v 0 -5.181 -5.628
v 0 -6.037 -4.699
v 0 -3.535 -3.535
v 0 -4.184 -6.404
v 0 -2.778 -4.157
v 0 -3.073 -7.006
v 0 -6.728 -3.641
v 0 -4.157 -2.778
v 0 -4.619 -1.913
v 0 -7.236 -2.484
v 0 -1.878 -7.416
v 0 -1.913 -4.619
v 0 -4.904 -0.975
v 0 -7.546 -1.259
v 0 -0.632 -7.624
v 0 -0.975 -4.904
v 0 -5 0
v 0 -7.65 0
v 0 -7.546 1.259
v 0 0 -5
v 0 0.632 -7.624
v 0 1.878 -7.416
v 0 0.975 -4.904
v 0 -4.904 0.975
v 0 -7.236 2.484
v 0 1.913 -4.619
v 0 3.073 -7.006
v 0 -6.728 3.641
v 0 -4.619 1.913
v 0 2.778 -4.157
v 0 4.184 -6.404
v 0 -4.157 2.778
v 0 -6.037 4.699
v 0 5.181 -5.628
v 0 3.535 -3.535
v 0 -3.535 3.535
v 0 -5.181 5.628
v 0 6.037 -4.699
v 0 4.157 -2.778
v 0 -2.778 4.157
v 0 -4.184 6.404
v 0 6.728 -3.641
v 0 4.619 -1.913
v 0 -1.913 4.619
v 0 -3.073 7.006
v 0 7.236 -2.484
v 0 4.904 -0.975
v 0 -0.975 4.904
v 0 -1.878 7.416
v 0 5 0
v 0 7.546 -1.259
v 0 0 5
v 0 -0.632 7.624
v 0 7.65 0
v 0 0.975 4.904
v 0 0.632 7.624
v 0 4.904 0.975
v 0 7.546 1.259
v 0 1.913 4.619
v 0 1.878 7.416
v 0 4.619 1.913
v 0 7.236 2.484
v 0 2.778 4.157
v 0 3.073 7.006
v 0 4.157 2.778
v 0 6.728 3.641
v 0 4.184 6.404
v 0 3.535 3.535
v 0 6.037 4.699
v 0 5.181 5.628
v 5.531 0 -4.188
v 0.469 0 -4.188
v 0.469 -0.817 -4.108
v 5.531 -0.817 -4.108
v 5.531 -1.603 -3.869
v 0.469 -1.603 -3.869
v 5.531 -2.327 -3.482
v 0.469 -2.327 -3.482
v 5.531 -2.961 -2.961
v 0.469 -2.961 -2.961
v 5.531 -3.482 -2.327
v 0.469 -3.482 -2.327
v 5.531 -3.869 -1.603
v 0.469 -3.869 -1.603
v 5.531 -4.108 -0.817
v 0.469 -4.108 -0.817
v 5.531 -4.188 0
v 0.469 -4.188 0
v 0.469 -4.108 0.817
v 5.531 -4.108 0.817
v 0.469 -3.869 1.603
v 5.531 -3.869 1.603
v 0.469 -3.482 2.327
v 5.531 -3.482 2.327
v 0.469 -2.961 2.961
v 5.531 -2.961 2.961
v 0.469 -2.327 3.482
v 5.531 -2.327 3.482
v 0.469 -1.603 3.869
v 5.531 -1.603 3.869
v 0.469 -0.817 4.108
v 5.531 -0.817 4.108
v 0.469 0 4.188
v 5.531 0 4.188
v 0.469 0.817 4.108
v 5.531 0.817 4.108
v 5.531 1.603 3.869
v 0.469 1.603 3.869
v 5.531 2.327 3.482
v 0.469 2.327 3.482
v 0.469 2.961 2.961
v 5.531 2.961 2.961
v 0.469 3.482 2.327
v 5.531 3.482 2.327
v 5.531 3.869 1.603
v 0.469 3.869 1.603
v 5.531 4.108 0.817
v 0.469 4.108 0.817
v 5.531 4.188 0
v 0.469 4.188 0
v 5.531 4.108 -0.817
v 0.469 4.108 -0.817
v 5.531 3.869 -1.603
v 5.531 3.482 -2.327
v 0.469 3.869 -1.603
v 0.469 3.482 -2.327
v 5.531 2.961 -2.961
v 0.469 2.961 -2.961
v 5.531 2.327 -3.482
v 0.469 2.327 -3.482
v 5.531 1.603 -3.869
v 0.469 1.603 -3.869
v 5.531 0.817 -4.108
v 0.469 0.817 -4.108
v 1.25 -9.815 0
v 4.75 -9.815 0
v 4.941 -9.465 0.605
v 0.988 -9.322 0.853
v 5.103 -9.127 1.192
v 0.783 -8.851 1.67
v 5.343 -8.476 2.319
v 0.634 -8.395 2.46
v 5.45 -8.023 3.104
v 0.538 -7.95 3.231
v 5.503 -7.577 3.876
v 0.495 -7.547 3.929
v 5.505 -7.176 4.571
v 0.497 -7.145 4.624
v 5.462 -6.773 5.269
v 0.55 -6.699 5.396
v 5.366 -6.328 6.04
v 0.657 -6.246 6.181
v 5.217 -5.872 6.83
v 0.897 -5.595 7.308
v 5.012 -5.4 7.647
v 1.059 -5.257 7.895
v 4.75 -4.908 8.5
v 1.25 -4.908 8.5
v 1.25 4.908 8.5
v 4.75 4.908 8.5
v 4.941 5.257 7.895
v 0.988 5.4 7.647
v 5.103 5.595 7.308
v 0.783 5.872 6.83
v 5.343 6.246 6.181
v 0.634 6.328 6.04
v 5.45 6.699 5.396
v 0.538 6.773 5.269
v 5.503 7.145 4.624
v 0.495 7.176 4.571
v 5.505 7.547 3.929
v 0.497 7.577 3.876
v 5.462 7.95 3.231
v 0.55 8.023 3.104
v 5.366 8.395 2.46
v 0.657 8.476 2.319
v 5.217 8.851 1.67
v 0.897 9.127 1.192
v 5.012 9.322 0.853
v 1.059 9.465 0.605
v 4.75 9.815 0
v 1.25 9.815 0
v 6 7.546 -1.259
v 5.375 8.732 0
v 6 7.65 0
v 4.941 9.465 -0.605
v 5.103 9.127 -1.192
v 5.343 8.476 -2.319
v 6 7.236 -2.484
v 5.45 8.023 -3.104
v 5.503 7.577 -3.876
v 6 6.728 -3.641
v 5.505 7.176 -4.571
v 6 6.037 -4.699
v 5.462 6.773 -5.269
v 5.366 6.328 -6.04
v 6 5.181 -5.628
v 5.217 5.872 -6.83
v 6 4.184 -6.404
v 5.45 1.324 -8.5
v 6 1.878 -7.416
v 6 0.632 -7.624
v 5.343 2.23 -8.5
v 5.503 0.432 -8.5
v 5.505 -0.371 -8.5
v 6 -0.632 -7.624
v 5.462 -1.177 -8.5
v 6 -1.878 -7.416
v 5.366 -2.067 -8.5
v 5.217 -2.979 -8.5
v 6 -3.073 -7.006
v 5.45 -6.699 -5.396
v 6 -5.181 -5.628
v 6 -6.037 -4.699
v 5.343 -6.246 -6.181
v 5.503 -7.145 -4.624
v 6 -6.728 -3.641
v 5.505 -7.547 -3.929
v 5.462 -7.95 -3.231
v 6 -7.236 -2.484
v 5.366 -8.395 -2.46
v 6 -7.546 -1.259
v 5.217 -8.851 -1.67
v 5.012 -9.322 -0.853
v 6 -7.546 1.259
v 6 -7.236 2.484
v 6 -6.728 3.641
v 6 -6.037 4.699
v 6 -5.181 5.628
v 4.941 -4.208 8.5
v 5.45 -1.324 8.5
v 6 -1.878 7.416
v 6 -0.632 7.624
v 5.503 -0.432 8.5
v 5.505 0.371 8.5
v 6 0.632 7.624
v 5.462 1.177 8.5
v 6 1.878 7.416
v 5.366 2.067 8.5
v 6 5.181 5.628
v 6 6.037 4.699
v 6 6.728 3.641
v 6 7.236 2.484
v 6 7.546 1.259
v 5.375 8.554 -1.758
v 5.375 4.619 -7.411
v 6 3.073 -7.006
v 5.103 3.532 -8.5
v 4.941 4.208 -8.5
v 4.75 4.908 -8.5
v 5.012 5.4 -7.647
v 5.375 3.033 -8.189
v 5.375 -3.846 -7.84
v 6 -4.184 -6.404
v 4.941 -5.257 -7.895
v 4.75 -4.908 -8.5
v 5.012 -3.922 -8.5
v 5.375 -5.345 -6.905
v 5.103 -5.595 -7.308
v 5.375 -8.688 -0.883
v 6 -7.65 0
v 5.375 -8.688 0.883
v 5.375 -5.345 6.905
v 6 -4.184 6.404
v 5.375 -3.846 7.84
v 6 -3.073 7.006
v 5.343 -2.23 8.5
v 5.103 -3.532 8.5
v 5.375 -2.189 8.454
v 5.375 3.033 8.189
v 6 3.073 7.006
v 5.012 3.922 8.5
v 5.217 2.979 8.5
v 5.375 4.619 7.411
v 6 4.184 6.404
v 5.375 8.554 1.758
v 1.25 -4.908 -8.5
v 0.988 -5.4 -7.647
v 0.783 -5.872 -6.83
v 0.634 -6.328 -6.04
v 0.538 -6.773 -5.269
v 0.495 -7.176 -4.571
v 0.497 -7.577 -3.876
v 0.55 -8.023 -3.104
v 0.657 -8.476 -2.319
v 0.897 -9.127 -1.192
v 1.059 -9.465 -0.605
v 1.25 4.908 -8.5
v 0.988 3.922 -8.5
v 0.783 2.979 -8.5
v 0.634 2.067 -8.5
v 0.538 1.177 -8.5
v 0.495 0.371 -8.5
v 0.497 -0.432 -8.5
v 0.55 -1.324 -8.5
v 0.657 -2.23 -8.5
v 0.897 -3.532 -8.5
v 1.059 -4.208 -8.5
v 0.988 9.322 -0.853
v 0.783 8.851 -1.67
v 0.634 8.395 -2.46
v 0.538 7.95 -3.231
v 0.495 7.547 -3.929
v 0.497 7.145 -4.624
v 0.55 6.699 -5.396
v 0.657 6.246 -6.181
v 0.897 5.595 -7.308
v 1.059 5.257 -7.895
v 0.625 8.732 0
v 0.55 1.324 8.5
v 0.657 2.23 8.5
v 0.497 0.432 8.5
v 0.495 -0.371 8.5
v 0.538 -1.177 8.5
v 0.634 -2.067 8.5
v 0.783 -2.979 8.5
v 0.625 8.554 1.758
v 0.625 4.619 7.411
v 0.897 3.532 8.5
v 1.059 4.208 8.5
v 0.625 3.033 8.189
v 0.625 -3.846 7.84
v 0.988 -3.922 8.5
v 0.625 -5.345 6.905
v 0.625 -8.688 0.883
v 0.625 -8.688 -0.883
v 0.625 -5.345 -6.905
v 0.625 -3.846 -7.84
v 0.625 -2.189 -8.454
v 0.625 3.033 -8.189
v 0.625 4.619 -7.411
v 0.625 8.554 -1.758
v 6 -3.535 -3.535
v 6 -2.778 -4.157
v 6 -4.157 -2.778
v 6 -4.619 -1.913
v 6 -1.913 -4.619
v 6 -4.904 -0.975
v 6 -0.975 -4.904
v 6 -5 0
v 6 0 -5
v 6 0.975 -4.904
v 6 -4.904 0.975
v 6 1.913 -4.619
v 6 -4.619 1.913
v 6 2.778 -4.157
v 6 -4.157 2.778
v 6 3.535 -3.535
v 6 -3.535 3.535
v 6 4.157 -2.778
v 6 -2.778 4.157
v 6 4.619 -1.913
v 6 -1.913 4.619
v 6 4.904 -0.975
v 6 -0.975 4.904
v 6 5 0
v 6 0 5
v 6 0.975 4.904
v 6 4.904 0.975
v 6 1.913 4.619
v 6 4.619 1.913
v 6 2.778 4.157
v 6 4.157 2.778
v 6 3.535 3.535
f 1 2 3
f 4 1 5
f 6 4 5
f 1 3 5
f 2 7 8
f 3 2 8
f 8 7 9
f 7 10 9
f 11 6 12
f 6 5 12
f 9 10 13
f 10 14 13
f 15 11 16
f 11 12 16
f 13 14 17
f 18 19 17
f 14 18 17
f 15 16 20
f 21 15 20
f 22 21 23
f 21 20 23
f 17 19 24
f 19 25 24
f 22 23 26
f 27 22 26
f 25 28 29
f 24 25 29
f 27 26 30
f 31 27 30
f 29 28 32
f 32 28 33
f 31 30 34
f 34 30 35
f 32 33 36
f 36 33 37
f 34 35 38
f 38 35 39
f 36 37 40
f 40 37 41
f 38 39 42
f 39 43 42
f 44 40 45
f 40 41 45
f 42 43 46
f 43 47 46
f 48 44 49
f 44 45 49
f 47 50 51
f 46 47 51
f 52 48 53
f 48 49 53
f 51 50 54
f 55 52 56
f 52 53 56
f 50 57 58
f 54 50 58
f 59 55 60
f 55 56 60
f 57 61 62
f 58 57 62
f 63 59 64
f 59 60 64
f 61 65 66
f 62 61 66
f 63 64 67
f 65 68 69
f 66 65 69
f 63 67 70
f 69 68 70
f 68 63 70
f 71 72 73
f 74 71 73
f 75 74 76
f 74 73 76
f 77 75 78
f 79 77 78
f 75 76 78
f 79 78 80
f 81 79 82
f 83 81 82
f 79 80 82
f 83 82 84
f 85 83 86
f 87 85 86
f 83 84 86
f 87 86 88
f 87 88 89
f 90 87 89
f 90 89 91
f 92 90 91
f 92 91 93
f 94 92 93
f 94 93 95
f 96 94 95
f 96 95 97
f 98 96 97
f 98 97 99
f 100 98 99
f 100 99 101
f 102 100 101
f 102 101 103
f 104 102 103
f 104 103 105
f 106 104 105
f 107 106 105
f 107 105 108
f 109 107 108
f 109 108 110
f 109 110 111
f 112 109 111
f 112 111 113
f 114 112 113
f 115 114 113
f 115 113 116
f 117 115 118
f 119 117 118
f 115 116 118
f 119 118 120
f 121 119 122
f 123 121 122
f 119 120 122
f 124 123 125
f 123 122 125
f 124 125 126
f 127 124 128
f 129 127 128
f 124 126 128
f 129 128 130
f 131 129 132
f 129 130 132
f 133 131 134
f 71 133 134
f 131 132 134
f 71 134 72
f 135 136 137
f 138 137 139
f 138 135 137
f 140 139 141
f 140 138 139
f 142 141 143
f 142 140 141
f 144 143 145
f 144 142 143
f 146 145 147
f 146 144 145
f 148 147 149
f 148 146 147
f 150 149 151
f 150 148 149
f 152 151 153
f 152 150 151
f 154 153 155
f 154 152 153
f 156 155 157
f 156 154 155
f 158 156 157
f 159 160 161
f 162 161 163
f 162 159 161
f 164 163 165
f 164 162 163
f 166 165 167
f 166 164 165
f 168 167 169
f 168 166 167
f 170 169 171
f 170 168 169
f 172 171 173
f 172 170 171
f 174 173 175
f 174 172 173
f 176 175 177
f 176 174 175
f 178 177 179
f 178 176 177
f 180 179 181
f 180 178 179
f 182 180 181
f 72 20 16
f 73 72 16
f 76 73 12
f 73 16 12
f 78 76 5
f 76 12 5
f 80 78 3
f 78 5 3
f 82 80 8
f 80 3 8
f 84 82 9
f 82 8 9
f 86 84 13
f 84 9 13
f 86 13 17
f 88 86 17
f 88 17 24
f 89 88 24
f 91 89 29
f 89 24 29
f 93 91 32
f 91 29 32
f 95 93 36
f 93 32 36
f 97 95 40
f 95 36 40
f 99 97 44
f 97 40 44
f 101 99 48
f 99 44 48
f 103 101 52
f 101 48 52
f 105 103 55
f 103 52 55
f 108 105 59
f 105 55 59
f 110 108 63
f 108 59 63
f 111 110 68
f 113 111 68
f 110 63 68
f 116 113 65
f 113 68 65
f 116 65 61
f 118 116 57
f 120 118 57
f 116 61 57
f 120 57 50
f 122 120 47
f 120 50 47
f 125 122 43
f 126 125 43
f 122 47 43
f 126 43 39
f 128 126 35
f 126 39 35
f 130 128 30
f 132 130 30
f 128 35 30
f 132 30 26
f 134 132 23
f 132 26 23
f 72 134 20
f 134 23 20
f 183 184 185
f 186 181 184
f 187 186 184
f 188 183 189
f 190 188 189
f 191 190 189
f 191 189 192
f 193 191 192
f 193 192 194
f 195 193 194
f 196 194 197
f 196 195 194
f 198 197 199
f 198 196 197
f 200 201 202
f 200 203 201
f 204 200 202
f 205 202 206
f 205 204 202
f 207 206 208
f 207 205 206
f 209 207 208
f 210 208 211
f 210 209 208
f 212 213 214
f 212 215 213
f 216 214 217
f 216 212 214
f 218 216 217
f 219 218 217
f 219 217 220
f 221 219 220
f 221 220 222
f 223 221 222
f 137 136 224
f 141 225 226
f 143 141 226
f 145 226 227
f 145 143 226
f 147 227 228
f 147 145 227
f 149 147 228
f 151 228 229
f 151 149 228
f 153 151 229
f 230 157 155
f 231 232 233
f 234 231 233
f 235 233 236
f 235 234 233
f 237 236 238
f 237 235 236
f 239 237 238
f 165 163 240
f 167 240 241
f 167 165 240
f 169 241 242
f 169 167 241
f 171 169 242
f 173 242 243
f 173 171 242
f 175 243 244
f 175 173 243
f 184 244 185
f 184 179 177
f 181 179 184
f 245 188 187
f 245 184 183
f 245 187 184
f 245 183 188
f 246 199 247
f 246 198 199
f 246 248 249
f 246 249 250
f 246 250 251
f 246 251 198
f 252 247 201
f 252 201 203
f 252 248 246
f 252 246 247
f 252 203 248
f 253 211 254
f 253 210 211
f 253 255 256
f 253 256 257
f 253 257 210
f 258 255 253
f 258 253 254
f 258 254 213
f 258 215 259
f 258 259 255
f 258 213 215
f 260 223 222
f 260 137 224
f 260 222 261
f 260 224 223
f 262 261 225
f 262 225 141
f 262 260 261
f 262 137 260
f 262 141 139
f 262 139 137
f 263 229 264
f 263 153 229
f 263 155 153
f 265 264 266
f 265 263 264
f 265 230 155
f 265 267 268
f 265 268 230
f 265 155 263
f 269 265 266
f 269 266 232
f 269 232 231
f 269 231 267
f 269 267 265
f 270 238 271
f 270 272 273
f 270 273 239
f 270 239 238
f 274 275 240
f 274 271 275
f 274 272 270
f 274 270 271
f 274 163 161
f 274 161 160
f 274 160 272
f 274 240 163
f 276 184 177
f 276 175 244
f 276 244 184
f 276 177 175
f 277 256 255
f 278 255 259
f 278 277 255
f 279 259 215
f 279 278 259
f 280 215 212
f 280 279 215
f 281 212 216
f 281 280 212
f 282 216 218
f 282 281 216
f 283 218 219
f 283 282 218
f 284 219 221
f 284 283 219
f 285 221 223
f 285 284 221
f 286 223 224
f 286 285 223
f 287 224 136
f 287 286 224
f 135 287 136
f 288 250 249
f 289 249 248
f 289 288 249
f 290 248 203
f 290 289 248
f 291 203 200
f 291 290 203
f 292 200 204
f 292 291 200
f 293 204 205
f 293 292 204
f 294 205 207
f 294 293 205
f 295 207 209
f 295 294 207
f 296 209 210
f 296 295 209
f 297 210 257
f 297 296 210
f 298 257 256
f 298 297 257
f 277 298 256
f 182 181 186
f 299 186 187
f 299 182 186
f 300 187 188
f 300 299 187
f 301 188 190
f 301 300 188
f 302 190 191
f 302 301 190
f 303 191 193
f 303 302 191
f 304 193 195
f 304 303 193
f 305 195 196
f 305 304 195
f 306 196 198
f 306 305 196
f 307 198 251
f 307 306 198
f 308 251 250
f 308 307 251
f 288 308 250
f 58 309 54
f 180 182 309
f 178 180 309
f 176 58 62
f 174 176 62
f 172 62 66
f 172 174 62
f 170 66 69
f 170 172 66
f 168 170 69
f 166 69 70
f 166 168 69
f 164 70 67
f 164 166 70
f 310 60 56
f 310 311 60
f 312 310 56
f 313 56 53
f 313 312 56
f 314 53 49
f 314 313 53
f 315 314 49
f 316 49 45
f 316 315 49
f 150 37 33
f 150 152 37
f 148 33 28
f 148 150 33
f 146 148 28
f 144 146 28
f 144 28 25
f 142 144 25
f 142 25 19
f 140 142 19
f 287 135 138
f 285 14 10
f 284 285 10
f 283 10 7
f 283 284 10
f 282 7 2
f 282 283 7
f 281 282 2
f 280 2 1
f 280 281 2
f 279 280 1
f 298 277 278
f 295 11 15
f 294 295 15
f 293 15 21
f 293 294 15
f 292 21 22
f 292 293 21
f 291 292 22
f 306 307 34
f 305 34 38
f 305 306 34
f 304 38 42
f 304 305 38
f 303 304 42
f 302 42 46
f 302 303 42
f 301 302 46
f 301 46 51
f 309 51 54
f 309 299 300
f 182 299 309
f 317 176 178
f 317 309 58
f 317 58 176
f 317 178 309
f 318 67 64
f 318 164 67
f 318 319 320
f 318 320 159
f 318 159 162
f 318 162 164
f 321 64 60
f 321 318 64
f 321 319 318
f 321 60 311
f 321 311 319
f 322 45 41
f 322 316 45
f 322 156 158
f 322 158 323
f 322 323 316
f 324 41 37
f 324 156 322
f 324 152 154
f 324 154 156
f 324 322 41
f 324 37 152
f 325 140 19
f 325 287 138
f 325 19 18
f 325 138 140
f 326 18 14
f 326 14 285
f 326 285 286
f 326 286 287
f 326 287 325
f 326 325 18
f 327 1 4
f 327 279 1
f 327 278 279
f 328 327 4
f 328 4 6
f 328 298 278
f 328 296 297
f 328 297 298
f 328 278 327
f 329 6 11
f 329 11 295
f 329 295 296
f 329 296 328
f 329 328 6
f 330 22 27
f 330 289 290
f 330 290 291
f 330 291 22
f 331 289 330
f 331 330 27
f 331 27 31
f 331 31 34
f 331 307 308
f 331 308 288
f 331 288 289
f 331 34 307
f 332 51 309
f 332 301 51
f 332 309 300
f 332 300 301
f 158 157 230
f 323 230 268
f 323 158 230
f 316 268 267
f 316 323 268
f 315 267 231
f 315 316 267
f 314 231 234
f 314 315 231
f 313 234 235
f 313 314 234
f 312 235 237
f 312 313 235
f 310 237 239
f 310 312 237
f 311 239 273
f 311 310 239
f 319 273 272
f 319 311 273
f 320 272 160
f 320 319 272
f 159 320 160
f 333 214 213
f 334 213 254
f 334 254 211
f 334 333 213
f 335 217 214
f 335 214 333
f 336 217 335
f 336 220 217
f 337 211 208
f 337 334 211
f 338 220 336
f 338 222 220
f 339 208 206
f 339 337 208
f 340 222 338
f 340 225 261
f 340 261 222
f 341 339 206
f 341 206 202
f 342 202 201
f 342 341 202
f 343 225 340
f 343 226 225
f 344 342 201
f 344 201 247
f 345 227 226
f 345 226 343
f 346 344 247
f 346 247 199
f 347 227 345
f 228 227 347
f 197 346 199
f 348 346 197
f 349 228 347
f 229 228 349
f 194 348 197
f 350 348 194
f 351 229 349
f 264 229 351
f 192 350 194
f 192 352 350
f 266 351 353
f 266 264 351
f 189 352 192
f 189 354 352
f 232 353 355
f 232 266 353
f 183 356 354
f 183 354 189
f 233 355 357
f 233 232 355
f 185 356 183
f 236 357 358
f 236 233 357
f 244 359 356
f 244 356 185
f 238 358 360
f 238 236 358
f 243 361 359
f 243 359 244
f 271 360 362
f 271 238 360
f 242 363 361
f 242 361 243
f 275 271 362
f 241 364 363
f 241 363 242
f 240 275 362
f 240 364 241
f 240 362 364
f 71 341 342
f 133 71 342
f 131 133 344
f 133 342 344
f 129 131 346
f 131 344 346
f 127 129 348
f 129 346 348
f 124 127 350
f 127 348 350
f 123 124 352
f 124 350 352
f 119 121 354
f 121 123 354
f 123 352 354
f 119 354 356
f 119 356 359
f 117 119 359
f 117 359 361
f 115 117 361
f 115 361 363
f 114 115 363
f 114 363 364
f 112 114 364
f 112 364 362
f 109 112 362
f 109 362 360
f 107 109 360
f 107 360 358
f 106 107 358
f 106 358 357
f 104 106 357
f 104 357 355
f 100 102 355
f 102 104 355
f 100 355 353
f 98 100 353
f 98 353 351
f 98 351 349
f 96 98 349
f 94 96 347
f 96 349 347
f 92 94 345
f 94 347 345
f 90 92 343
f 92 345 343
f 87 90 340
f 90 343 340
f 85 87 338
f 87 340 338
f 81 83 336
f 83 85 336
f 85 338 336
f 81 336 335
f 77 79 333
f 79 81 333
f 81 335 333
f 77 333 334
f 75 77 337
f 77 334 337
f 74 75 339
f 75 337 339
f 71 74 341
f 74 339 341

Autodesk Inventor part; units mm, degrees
ref_plane "YZ Plane" through (0, 0, 0) normal (1, 0, 0) x (0, 1, 0)
ref_plane "XZ Plane" through (0, 0, 0) normal (0, 1, 0) x (-1, 0, 0)
sketch "Эскиз1" plane through (0, 0, 0) normal (1, 0, 0) x (0, 1, 0)
  line L0 (-9.815, 0) -> (-4.9075, 8.5)
  line L1 (-4.9075, 8.5) -> (4.9075, 8.5)
  line L2 (4.9075, 8.5) -> (9.815, 0)
  line L3 (9.815, 0) -> (4.9075, -8.5)
  line L4 (4.9075, -8.5) -> (-4.9075, -8.5)
  line L5 (-4.9075, -8.5) -> (-9.815, 0)
  point P0 (0, 0)
  point P1 (0, 0)
  dimension "d0" = 19.6299
extrude "Базовый элемент" add sketch "Эскиз1" along normal blind 6
sketch "Эскиз2" plane through (0, 0, 0) normal (0, 0, 1) x (1, 0, 0)
  line L0 (0, 4.9075) -> (0, 9.815) projected
  line L1 (0, 9.815) -> (6, 9.815) projected
  line L2 (6, 4.9075) -> (6, 9.815) projected
  line L3 (-1.2, 0) -> (7.2, 0) projected
  line L4 (1.2499, 9.815) -> (0, 7.65)
  line L5 (4.7501, 9.815) -> (6, 7.65)
  dimension "d3" = 30
  dimension "d4" = 30
  dimension "d5" = 15.3
  dimension "d6" = 15.3
revolve "Фаска1" cut sketch "Эскиз2" angle 360 about axis through (-10, 0, 0) along (1, 0, 0)
sketch "Эскиз3" plane through (6, 0, 0) normal (1, 0, 0) x (0, 0, -1)
  arc A0 (-0.625, -1.0825) -> (0.625, -1.0825) centre (0, 0) ccw projected
hole "Резьба" at (6, 0, 0) direction (-1, 0, 0) diameter 8.376 end through all thread size "M10x1.5" class "6H" standard "ISO Metric profile"
chamfer "Фаска2" distance 0.8119 angle 30 1 edges at (6, 0, 4.188) measured on face at (6, 6.4117, -0.7785)
chamfer "Фаска3" distance 0.8119 angle 30 1 edges at (0, 0, 4.188) measured on face at (0, 6.4117, -0.7785)
ref_plane "Work Plane1" through (-20.7291, 0, 0) normal (0, -0.866, -0.5) x (1, 0, 0)
equation "\"d0\" = 1.1547 * SW"
equation "\"d1\" = KOH"
equation "\"d3\" = ANG1"
equation "\"d4\" = ANG2"
equation "\"d5\" = SW0"
equation "\"d6\" = SW01"
equation "\"d8\" = -0.5 * GD1 + 0.5 * NND"
equation "\"d40\" = -0.5 * GD1 + 0.5 * NND"
equation "\"d10\" = -0.5 * GD1 + 0.5 * NND"
equation "\"d41\" = -0.5 * GD1 + 0.5 * NND"
equation "\"ANG1\" = 30deg"
equation "\"ANG2\" = 30deg"
equation "\"KOH\" = 6"
equation "\"SW\" = 17"
equation "\"SW0\" = 15.3"
equation "\"SW01\" = 15.3"
equation "\"GUL\" = 0.541266 * PTC"
equation "\"LADI\" = 16.15"
equation "\"TOA\" = 30deg"
equation "\"FAWI\" = 30deg"
equation "\"PTC\" = 1.5"
equation "\"E0\" = 1.155 * SW"
equation "\"GAL\" = 0.541266 * PTC"
equation "\"GD1\" = 8.376202"
equation "\"NND\" = 10"
properties part number "Гайка M10-6H ГОСТ 5916-70" material "Сталь, мягкая"
